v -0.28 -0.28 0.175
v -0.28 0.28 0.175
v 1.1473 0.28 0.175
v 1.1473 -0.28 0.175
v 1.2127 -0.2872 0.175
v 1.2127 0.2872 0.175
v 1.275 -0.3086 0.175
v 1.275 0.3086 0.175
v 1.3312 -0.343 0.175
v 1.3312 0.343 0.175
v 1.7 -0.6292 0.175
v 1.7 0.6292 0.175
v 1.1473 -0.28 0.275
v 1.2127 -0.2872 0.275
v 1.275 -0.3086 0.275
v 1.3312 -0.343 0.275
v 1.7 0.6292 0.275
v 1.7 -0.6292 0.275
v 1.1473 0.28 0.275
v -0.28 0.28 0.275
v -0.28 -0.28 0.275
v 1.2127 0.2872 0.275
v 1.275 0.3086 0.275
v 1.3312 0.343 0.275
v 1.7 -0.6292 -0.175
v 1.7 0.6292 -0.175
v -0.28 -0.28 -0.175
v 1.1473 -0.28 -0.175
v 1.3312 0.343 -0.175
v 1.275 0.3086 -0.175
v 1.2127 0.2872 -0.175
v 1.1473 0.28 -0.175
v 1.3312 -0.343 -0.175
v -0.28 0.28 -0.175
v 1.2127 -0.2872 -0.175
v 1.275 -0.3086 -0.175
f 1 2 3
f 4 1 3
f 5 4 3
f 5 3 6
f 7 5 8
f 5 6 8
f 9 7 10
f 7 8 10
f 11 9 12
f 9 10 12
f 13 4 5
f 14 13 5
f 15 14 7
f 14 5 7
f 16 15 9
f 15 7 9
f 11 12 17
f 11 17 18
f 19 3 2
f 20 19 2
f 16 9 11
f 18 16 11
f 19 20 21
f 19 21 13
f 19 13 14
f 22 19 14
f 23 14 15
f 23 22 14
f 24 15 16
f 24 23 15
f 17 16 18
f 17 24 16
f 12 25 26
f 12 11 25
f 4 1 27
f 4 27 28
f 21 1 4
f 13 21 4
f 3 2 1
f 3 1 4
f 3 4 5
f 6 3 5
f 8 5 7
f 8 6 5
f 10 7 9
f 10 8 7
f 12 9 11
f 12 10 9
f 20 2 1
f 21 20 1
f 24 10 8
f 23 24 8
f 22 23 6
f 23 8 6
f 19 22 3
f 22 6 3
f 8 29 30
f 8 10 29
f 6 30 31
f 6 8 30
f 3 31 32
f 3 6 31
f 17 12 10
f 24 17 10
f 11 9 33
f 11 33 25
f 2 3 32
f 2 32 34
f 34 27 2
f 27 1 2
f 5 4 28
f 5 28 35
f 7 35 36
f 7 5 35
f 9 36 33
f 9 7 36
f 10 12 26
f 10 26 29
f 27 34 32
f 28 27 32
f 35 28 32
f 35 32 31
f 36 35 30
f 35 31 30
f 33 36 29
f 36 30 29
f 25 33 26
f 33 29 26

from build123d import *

# Parameters (mm, degrees)
F0_R     = 0.5
F1_DEPTH = 0.175
F2_R     = 0.3
F3_W     = 1.98
F3_H     = 3
F4_DEPTH = 0.5
F6_DEPTH = 0.1


# Not quite as in the source:
# - a feature of the source that left no trace in its solid (it failed there, or was rolled back) is left out


with BuildPart() as f1:
    # F0 (on Top) → F1 (new body, symmetric)
    with BuildSketch(Plane.XY):
        with BuildLine():
            Line((-7, 1.25), (-7, 0))
            Line((-7, 0), (-7, -1.25))
            Line((-7, -1.25), (-2.5, -1.25))
            Line((-2.5, -1.25), (-1.3311730507, -0.3429902873))
            ThreePointArc((-1.3311730507, -0.3429902873), (-1.2444571304, -0.2961841144), (-1.1472535137, -0.28))
            Line((-1.1472535137, -0.28), (0, -0.28))
            Line((0, -0.28), (1.1472535137, -0.28))
            ThreePointArc((1.1472535137, -0.28), (1.2444571304, -0.2961841144), (1.3311730507, -0.3429902873))
            Line((1.3311730507, -0.3429902873), (2.5, -1.25))
            Line((2.5, -1.25), (7, -1.25))
            Line((7, -1.25), (7, 0))
            Line((7, 0), (7, 1.25))
            Line((7, 1.25), (2.5, 1.25))
            Line((2.5, 1.25), (1.3311730507, 0.3429902873))
            ThreePointArc((1.3311730507, 0.3429902873), (1.2444571304, 0.2961841144), (1.1472535137, 0.28))
            Line((1.1472535137, 0.28), (0, 0.28))
            Line((0, 0.28), (-1.1472535137, 0.28))
            ThreePointArc((-1.1472535137, 0.28), (-1.2444571304, 0.2961841144), (-1.3311730507, 0.3429902873))
            Line((-1.3311730507, 0.3429902873), (-2.5, 1.25))
            Line((-2.5, 1.25), (-7, 1.25))
        make_face()
        with Locations((-5, 0)):
            Circle(F0_R, mode=Mode.SUBTRACT)
        with Locations((5, 0)):
            Circle(F0_R, mode=Mode.SUBTRACT)
    extrude(amount=F1_DEPTH, both=True)

    # F2
    f2_edges = [f1.edges().sort_by_distance(p)[0] for p in [
        (-2.5, -1.25, 0),
        (2.5, -1.25, 0),
        (-2.5, 1.25, 0),
        (2.5, 1.25, 0),
    ]]
    fillet(f2_edges, radius=F2_R)


with BuildPart() as f4:
    # F3 (on Top) → F4 (new body, symmetric)
    with BuildSketch(Plane.XY):
        with Locations((0.71, 0)):
            Rectangle(F3_W, F3_H)
    extrude(amount=F4_DEPTH, both=True)

    # F5: intersect F1
    add(f1.part, mode=Mode.INTERSECT)


with BuildPart() as f6:
    # F6 (new): a face of the model
    f6_faces = [f4.part.faces().sort_by_distance(p)[0] for p in [
        (0.8150350005, 0, 0.175),
    ]]
    extrude(f6_faces, amount=F6_DEPTH)


solid = Compound([f4.part, f6.part])
